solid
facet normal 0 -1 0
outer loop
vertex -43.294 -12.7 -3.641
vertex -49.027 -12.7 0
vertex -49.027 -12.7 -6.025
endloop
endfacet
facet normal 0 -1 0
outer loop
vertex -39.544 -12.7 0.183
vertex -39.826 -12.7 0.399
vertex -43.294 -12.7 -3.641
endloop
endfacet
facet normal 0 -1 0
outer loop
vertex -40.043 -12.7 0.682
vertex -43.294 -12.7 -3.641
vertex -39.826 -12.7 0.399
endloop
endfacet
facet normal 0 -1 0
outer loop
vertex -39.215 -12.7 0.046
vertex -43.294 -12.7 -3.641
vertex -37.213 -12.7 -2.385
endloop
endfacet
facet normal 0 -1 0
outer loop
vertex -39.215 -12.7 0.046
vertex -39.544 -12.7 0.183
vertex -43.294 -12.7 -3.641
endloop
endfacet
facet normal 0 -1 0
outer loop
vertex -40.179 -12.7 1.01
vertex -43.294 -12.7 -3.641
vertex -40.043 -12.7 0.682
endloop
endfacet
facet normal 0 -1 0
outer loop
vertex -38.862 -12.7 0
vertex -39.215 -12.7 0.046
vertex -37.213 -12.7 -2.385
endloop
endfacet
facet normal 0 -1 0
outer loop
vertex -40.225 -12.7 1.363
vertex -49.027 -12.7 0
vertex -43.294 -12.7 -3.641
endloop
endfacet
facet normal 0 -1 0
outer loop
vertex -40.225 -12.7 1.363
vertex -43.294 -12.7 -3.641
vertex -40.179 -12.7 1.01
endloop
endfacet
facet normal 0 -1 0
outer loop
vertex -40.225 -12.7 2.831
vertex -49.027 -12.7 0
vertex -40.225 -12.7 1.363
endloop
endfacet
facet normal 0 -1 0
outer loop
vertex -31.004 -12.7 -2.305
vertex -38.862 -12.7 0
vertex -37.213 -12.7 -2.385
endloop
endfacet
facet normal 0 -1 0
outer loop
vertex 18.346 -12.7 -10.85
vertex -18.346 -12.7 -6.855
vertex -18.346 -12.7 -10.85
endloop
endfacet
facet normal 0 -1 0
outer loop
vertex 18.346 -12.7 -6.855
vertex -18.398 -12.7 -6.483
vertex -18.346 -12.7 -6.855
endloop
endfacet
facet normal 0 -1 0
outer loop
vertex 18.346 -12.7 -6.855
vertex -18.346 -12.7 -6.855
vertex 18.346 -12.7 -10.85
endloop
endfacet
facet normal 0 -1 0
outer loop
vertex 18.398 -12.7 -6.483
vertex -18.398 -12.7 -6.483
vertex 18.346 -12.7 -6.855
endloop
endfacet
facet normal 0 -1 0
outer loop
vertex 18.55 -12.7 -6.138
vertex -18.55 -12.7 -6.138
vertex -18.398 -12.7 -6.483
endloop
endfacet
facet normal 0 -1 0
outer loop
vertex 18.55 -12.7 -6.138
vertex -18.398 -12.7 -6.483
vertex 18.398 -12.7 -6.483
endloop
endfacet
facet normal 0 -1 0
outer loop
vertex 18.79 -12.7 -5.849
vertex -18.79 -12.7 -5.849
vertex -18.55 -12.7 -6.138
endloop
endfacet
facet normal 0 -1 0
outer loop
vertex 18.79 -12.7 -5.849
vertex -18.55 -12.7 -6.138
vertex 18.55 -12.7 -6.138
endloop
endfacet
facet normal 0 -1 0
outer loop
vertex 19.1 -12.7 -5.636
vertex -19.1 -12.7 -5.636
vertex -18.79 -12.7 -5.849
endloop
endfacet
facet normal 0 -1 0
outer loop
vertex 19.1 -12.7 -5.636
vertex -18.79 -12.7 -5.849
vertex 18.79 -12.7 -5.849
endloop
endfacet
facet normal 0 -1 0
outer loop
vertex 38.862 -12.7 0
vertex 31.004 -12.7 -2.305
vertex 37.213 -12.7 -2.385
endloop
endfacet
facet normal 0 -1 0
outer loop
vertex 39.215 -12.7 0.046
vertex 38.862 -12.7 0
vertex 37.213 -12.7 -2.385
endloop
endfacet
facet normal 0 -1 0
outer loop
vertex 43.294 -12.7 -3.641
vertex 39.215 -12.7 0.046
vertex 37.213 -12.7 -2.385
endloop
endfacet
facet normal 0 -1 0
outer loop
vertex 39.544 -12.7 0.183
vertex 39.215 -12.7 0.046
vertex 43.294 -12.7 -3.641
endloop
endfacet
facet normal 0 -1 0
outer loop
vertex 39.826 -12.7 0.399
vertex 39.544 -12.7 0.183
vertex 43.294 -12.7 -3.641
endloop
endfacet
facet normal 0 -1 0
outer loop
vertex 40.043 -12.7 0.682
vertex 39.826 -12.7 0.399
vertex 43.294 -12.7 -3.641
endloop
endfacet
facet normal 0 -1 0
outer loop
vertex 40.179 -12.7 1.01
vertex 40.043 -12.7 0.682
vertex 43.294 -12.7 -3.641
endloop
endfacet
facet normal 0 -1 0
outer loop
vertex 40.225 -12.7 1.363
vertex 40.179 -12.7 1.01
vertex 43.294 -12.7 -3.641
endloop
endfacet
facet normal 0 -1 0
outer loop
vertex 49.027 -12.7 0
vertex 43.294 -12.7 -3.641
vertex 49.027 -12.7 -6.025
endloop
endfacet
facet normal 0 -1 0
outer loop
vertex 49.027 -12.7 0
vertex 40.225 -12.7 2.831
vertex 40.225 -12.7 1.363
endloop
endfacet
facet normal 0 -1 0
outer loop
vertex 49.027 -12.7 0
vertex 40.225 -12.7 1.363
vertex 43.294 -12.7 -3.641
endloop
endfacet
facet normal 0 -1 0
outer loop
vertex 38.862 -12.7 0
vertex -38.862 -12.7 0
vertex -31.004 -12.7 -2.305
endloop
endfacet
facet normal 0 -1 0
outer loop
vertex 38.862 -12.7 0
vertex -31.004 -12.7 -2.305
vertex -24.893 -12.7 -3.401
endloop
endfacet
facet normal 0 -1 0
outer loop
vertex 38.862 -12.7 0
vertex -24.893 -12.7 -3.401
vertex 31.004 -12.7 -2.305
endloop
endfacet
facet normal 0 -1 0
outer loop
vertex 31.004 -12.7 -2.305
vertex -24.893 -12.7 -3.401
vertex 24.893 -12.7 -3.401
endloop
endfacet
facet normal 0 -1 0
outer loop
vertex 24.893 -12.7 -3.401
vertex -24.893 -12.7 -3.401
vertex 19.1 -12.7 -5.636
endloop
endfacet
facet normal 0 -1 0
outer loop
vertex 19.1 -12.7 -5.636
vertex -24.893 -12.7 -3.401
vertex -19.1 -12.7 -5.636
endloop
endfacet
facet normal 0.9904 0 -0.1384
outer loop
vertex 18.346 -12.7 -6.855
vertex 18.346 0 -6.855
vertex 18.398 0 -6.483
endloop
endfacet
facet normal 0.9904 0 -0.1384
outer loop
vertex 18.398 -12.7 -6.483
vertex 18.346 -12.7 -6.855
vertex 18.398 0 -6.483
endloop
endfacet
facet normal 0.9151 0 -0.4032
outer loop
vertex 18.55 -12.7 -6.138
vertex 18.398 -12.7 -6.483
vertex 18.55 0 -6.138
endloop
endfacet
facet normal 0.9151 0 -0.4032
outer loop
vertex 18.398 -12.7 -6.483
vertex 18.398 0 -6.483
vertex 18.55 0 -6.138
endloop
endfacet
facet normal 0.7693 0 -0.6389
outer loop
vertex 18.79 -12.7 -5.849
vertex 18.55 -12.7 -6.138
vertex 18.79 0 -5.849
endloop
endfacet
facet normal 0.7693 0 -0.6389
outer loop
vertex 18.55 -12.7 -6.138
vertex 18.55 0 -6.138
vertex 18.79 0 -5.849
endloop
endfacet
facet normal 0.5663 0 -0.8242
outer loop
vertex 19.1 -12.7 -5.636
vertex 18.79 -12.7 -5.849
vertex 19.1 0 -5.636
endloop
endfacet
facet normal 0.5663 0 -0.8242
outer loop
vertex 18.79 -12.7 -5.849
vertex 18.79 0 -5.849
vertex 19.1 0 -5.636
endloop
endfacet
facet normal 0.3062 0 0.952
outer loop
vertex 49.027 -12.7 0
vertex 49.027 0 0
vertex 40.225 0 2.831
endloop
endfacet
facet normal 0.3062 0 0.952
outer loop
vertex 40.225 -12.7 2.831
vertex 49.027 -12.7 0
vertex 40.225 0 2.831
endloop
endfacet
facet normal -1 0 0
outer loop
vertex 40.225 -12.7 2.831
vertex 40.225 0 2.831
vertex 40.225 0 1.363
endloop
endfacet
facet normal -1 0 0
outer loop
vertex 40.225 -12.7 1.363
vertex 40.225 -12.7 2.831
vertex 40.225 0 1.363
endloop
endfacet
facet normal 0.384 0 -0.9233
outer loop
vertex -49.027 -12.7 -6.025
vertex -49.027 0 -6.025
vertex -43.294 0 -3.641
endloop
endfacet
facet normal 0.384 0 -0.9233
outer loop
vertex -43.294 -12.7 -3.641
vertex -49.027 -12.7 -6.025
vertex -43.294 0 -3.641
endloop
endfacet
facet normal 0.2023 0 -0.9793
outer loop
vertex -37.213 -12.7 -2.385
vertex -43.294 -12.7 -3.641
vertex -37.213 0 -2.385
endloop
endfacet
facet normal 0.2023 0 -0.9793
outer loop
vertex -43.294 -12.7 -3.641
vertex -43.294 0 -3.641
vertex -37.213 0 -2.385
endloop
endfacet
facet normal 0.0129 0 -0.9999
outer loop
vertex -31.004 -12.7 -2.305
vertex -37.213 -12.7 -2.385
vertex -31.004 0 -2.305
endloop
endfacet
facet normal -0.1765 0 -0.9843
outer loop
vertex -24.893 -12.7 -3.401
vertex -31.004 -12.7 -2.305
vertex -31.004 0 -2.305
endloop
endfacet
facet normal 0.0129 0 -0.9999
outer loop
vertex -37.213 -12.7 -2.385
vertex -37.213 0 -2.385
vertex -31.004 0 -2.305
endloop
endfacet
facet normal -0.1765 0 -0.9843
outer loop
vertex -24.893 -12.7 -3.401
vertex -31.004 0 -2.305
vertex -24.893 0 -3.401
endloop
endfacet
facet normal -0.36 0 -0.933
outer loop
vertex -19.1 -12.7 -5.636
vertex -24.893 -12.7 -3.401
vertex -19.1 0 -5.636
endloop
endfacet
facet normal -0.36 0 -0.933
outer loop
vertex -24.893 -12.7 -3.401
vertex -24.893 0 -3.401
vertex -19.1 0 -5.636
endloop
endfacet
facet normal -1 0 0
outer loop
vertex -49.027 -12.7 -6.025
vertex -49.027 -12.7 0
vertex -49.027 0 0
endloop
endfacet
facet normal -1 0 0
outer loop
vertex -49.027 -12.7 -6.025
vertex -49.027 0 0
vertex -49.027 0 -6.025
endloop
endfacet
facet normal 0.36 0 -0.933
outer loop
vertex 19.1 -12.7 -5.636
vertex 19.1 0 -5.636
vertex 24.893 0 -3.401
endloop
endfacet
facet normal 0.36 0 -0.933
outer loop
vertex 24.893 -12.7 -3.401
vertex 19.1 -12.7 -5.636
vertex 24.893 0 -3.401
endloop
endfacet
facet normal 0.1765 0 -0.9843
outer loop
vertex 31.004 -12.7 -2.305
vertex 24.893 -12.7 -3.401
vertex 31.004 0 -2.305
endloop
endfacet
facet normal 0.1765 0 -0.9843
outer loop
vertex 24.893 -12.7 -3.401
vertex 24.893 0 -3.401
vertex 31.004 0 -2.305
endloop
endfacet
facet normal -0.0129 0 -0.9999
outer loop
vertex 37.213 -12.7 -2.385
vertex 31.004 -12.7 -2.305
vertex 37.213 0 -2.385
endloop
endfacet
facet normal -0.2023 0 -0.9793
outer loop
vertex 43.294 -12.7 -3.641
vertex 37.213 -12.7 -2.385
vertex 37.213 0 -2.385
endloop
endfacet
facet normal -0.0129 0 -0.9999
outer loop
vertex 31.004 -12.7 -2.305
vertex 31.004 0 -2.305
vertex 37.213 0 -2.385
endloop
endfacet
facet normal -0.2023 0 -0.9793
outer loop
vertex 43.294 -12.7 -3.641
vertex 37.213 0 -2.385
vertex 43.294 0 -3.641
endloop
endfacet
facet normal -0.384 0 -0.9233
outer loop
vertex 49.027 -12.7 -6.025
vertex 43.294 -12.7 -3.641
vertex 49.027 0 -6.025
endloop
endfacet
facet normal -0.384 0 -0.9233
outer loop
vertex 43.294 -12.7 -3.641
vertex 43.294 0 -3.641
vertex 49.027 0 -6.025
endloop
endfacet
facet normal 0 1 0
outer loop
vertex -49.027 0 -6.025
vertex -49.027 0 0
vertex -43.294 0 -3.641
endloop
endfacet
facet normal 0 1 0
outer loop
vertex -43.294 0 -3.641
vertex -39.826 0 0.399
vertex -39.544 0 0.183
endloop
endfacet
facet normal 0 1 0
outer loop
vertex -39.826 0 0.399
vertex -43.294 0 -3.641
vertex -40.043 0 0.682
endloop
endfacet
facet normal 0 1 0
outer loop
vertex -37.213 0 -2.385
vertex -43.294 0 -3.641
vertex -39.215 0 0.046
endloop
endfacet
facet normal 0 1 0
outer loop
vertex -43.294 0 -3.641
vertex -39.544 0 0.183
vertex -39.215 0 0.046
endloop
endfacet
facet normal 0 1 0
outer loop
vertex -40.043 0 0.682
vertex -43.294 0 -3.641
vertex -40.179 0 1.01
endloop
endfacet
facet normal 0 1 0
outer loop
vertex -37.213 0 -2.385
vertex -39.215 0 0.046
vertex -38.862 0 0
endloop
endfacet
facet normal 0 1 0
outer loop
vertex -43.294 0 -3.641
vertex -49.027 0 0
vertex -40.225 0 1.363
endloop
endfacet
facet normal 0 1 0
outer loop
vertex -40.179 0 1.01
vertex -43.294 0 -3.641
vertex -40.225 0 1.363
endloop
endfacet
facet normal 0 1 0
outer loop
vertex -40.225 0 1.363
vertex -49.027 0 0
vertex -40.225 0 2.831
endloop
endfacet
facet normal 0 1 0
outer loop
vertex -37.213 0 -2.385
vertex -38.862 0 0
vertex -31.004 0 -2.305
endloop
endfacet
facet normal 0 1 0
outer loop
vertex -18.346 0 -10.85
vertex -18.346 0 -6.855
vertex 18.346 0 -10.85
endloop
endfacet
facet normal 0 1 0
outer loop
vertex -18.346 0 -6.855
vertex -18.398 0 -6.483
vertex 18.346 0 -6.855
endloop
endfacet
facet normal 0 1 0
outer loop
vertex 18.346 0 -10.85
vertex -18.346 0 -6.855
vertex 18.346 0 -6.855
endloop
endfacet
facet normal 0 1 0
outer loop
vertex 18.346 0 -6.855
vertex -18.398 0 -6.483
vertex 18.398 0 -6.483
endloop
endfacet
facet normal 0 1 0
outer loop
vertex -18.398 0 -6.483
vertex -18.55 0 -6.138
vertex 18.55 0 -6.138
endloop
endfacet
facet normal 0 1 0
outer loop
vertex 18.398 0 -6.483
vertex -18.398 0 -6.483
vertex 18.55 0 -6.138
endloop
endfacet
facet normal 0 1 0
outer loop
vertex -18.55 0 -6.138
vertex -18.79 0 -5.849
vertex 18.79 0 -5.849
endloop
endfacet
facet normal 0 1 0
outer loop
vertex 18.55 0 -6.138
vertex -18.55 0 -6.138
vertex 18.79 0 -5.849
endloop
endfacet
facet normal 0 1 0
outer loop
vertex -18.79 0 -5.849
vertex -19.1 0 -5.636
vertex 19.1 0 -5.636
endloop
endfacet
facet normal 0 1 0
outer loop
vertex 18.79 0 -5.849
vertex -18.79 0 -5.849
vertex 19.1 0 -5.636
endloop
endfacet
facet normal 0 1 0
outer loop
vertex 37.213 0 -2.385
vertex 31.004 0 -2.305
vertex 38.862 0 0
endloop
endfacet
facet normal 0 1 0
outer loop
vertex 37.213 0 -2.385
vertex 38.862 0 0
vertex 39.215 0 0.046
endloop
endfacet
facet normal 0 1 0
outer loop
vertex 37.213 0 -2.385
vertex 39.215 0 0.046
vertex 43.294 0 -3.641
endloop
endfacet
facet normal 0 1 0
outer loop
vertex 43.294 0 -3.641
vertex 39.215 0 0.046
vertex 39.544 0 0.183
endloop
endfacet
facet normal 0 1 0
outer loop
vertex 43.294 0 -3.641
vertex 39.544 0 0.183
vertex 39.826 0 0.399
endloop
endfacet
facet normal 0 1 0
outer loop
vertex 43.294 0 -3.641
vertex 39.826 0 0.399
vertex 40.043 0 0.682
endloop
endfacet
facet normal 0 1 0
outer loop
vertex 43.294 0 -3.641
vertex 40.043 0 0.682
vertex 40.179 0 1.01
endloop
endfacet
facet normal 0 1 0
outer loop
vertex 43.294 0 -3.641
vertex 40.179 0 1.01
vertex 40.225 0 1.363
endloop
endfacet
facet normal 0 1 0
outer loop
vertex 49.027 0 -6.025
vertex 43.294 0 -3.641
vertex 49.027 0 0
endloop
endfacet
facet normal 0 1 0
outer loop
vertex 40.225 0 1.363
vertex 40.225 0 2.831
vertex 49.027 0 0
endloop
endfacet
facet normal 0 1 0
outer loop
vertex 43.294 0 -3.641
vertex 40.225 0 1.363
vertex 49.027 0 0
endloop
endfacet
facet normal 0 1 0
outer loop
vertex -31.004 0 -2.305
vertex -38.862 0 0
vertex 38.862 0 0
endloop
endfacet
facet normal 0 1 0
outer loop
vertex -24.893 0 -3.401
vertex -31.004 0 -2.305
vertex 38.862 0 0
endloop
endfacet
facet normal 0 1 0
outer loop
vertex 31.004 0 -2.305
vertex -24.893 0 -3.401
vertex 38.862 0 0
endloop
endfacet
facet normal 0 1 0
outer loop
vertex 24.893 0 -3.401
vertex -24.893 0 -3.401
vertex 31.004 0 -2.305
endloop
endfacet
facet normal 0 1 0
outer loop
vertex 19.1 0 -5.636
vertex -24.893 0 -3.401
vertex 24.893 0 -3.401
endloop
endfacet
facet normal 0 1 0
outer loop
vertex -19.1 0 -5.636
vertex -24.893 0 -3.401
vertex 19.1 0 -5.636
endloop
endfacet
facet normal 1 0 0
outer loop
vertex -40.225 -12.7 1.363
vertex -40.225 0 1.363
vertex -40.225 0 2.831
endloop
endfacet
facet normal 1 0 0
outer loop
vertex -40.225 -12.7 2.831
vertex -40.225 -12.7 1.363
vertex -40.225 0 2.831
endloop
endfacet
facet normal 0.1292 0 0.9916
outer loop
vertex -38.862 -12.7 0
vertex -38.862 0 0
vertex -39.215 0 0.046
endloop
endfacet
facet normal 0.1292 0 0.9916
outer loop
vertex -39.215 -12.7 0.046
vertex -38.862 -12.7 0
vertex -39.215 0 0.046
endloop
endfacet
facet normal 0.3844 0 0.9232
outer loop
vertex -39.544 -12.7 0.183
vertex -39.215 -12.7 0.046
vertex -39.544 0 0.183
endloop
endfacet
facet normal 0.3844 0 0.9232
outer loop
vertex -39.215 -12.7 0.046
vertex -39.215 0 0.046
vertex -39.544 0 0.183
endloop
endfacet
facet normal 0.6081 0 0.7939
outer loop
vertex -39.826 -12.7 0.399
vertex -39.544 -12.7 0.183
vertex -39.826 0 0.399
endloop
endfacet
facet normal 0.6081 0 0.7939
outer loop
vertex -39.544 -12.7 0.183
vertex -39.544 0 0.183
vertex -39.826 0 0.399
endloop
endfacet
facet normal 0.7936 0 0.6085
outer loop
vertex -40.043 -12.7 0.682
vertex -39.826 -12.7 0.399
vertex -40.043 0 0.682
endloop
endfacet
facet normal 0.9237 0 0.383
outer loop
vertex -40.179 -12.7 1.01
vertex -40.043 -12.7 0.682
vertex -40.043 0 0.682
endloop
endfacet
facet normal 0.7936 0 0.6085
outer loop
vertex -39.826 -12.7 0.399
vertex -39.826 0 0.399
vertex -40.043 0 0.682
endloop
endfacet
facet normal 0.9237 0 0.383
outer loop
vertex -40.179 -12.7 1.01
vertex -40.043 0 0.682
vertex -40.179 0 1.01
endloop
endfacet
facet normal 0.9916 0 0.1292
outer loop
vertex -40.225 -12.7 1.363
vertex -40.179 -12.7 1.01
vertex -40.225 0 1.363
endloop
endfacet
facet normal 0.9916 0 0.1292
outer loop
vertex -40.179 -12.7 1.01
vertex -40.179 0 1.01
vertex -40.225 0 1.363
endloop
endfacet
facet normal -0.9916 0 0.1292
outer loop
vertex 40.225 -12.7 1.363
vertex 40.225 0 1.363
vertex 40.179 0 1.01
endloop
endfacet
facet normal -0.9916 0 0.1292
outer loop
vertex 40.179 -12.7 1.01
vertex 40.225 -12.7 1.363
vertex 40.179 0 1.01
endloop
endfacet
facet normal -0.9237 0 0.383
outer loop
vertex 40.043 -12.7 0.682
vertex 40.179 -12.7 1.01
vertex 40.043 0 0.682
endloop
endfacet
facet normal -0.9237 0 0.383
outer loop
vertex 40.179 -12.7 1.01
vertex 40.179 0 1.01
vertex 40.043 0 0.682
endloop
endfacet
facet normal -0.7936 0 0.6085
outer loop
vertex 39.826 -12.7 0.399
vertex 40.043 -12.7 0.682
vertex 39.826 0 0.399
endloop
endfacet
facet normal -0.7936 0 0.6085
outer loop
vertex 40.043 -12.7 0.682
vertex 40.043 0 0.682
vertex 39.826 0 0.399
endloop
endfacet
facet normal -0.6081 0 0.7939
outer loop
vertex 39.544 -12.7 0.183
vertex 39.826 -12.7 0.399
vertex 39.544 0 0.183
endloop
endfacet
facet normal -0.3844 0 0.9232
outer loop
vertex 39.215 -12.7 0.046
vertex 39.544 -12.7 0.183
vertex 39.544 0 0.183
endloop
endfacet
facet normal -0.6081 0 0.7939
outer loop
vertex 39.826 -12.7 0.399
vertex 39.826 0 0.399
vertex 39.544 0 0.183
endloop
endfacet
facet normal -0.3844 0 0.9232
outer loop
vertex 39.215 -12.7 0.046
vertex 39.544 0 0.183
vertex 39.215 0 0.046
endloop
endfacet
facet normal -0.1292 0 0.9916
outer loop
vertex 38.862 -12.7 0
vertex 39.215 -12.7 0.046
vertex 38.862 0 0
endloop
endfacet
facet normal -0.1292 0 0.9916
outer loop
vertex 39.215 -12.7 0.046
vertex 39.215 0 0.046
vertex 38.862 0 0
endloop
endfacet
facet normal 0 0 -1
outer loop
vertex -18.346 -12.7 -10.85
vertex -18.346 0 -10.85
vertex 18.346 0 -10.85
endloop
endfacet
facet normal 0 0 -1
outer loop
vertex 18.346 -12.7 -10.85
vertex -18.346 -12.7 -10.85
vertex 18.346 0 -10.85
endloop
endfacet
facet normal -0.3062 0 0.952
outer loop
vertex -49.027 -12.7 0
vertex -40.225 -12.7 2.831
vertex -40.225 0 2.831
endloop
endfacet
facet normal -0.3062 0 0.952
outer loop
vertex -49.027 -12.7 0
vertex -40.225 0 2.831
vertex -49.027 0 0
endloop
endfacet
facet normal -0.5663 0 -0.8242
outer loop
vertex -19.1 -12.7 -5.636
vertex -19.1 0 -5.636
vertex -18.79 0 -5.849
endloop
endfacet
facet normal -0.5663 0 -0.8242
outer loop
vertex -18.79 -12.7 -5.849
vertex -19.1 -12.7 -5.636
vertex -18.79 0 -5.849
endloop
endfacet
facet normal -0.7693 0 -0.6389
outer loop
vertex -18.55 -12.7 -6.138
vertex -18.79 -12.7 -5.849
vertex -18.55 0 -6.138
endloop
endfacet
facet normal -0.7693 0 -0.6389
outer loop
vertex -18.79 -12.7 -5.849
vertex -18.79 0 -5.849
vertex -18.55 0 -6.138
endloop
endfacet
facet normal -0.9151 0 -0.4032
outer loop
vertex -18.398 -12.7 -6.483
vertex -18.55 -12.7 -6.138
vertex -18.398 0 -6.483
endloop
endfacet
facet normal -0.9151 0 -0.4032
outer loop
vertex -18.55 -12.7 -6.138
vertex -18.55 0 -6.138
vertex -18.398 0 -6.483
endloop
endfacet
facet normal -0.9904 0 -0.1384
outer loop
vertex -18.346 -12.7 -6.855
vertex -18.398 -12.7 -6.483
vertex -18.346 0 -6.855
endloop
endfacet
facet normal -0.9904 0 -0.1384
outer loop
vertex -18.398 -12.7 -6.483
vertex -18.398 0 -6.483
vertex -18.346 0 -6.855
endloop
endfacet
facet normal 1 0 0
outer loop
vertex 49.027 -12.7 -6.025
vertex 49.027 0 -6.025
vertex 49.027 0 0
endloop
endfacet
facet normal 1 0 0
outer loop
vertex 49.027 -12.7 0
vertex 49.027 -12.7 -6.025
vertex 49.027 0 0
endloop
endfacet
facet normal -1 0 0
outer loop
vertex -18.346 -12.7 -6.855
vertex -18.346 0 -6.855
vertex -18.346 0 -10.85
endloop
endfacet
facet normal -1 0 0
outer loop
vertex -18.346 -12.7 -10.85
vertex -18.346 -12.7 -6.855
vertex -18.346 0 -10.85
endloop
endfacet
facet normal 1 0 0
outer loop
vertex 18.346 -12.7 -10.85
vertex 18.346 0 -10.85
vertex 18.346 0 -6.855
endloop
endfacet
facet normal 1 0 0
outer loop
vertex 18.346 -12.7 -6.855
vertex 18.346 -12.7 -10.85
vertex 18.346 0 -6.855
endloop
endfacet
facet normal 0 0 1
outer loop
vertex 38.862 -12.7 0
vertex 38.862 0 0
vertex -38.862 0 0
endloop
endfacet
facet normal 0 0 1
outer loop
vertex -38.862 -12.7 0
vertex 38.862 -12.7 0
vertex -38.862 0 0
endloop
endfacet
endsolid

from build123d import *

# Parameters (mm, degrees)
F1_DEPTH = 12.7


with BuildPart() as f1:
    # F0 (on Front) → F1 (new body)
    with BuildSketch(Plane.XZ):
        with BuildLine():
            Line((0, -10.849522), (0, 0))
            Line((0, 0), (-38.862, 0))
            ThreePointArc((-38.862, 0), (-39.825896, 0.399259), (-40.225154, 1.363154))
            Line((-40.225154, 1.363154), (-40.225154, 2.830707))
            Line((-40.225154, 2.830707), (-49.026658, 0))
            Line((-49.026658, 0), (-49.026658, -6.0248))
            ThreePointArc((-49.026658, -6.0248), (-34.110593, -2.19715), (-19.100076, -5.635793))
            ThreePointArc((-19.100076, -5.635793), (-18.549908, -6.13839), (-18.34623, -6.855191))
            Line((-18.34623, -6.855191), (-18.34623, -10.849522))
            Line((-18.34623, -10.849522), (0, -10.849522))
        make_face()
        with BuildLine():
            Line((38.862, 0), (0, 0))
            Line((0, 0), (0, -10.849522))
            Line((0, -10.849522), (18.34623, -10.849522))
            Line((18.34623, -10.849522), (18.34623, -6.855191))
            ThreePointArc((18.34623, -6.855191), (18.549908, -6.13839), (19.100076, -5.635793))
            ThreePointArc((19.100076, -5.635793), (34.110593, -2.19715), (49.026658, -6.0248))
            Line((49.026658, -6.0248), (49.026658, 0))
            Line((49.026658, 0), (40.225154, 2.830707))
            Line((40.225154, 2.830707), (40.225154, 1.363154))
            ThreePointArc((40.225154, 1.363154), (39.825896, 0.399259), (38.862, 0))
        make_face()
    extrude(amount=F1_DEPTH)


solid = f1.part
